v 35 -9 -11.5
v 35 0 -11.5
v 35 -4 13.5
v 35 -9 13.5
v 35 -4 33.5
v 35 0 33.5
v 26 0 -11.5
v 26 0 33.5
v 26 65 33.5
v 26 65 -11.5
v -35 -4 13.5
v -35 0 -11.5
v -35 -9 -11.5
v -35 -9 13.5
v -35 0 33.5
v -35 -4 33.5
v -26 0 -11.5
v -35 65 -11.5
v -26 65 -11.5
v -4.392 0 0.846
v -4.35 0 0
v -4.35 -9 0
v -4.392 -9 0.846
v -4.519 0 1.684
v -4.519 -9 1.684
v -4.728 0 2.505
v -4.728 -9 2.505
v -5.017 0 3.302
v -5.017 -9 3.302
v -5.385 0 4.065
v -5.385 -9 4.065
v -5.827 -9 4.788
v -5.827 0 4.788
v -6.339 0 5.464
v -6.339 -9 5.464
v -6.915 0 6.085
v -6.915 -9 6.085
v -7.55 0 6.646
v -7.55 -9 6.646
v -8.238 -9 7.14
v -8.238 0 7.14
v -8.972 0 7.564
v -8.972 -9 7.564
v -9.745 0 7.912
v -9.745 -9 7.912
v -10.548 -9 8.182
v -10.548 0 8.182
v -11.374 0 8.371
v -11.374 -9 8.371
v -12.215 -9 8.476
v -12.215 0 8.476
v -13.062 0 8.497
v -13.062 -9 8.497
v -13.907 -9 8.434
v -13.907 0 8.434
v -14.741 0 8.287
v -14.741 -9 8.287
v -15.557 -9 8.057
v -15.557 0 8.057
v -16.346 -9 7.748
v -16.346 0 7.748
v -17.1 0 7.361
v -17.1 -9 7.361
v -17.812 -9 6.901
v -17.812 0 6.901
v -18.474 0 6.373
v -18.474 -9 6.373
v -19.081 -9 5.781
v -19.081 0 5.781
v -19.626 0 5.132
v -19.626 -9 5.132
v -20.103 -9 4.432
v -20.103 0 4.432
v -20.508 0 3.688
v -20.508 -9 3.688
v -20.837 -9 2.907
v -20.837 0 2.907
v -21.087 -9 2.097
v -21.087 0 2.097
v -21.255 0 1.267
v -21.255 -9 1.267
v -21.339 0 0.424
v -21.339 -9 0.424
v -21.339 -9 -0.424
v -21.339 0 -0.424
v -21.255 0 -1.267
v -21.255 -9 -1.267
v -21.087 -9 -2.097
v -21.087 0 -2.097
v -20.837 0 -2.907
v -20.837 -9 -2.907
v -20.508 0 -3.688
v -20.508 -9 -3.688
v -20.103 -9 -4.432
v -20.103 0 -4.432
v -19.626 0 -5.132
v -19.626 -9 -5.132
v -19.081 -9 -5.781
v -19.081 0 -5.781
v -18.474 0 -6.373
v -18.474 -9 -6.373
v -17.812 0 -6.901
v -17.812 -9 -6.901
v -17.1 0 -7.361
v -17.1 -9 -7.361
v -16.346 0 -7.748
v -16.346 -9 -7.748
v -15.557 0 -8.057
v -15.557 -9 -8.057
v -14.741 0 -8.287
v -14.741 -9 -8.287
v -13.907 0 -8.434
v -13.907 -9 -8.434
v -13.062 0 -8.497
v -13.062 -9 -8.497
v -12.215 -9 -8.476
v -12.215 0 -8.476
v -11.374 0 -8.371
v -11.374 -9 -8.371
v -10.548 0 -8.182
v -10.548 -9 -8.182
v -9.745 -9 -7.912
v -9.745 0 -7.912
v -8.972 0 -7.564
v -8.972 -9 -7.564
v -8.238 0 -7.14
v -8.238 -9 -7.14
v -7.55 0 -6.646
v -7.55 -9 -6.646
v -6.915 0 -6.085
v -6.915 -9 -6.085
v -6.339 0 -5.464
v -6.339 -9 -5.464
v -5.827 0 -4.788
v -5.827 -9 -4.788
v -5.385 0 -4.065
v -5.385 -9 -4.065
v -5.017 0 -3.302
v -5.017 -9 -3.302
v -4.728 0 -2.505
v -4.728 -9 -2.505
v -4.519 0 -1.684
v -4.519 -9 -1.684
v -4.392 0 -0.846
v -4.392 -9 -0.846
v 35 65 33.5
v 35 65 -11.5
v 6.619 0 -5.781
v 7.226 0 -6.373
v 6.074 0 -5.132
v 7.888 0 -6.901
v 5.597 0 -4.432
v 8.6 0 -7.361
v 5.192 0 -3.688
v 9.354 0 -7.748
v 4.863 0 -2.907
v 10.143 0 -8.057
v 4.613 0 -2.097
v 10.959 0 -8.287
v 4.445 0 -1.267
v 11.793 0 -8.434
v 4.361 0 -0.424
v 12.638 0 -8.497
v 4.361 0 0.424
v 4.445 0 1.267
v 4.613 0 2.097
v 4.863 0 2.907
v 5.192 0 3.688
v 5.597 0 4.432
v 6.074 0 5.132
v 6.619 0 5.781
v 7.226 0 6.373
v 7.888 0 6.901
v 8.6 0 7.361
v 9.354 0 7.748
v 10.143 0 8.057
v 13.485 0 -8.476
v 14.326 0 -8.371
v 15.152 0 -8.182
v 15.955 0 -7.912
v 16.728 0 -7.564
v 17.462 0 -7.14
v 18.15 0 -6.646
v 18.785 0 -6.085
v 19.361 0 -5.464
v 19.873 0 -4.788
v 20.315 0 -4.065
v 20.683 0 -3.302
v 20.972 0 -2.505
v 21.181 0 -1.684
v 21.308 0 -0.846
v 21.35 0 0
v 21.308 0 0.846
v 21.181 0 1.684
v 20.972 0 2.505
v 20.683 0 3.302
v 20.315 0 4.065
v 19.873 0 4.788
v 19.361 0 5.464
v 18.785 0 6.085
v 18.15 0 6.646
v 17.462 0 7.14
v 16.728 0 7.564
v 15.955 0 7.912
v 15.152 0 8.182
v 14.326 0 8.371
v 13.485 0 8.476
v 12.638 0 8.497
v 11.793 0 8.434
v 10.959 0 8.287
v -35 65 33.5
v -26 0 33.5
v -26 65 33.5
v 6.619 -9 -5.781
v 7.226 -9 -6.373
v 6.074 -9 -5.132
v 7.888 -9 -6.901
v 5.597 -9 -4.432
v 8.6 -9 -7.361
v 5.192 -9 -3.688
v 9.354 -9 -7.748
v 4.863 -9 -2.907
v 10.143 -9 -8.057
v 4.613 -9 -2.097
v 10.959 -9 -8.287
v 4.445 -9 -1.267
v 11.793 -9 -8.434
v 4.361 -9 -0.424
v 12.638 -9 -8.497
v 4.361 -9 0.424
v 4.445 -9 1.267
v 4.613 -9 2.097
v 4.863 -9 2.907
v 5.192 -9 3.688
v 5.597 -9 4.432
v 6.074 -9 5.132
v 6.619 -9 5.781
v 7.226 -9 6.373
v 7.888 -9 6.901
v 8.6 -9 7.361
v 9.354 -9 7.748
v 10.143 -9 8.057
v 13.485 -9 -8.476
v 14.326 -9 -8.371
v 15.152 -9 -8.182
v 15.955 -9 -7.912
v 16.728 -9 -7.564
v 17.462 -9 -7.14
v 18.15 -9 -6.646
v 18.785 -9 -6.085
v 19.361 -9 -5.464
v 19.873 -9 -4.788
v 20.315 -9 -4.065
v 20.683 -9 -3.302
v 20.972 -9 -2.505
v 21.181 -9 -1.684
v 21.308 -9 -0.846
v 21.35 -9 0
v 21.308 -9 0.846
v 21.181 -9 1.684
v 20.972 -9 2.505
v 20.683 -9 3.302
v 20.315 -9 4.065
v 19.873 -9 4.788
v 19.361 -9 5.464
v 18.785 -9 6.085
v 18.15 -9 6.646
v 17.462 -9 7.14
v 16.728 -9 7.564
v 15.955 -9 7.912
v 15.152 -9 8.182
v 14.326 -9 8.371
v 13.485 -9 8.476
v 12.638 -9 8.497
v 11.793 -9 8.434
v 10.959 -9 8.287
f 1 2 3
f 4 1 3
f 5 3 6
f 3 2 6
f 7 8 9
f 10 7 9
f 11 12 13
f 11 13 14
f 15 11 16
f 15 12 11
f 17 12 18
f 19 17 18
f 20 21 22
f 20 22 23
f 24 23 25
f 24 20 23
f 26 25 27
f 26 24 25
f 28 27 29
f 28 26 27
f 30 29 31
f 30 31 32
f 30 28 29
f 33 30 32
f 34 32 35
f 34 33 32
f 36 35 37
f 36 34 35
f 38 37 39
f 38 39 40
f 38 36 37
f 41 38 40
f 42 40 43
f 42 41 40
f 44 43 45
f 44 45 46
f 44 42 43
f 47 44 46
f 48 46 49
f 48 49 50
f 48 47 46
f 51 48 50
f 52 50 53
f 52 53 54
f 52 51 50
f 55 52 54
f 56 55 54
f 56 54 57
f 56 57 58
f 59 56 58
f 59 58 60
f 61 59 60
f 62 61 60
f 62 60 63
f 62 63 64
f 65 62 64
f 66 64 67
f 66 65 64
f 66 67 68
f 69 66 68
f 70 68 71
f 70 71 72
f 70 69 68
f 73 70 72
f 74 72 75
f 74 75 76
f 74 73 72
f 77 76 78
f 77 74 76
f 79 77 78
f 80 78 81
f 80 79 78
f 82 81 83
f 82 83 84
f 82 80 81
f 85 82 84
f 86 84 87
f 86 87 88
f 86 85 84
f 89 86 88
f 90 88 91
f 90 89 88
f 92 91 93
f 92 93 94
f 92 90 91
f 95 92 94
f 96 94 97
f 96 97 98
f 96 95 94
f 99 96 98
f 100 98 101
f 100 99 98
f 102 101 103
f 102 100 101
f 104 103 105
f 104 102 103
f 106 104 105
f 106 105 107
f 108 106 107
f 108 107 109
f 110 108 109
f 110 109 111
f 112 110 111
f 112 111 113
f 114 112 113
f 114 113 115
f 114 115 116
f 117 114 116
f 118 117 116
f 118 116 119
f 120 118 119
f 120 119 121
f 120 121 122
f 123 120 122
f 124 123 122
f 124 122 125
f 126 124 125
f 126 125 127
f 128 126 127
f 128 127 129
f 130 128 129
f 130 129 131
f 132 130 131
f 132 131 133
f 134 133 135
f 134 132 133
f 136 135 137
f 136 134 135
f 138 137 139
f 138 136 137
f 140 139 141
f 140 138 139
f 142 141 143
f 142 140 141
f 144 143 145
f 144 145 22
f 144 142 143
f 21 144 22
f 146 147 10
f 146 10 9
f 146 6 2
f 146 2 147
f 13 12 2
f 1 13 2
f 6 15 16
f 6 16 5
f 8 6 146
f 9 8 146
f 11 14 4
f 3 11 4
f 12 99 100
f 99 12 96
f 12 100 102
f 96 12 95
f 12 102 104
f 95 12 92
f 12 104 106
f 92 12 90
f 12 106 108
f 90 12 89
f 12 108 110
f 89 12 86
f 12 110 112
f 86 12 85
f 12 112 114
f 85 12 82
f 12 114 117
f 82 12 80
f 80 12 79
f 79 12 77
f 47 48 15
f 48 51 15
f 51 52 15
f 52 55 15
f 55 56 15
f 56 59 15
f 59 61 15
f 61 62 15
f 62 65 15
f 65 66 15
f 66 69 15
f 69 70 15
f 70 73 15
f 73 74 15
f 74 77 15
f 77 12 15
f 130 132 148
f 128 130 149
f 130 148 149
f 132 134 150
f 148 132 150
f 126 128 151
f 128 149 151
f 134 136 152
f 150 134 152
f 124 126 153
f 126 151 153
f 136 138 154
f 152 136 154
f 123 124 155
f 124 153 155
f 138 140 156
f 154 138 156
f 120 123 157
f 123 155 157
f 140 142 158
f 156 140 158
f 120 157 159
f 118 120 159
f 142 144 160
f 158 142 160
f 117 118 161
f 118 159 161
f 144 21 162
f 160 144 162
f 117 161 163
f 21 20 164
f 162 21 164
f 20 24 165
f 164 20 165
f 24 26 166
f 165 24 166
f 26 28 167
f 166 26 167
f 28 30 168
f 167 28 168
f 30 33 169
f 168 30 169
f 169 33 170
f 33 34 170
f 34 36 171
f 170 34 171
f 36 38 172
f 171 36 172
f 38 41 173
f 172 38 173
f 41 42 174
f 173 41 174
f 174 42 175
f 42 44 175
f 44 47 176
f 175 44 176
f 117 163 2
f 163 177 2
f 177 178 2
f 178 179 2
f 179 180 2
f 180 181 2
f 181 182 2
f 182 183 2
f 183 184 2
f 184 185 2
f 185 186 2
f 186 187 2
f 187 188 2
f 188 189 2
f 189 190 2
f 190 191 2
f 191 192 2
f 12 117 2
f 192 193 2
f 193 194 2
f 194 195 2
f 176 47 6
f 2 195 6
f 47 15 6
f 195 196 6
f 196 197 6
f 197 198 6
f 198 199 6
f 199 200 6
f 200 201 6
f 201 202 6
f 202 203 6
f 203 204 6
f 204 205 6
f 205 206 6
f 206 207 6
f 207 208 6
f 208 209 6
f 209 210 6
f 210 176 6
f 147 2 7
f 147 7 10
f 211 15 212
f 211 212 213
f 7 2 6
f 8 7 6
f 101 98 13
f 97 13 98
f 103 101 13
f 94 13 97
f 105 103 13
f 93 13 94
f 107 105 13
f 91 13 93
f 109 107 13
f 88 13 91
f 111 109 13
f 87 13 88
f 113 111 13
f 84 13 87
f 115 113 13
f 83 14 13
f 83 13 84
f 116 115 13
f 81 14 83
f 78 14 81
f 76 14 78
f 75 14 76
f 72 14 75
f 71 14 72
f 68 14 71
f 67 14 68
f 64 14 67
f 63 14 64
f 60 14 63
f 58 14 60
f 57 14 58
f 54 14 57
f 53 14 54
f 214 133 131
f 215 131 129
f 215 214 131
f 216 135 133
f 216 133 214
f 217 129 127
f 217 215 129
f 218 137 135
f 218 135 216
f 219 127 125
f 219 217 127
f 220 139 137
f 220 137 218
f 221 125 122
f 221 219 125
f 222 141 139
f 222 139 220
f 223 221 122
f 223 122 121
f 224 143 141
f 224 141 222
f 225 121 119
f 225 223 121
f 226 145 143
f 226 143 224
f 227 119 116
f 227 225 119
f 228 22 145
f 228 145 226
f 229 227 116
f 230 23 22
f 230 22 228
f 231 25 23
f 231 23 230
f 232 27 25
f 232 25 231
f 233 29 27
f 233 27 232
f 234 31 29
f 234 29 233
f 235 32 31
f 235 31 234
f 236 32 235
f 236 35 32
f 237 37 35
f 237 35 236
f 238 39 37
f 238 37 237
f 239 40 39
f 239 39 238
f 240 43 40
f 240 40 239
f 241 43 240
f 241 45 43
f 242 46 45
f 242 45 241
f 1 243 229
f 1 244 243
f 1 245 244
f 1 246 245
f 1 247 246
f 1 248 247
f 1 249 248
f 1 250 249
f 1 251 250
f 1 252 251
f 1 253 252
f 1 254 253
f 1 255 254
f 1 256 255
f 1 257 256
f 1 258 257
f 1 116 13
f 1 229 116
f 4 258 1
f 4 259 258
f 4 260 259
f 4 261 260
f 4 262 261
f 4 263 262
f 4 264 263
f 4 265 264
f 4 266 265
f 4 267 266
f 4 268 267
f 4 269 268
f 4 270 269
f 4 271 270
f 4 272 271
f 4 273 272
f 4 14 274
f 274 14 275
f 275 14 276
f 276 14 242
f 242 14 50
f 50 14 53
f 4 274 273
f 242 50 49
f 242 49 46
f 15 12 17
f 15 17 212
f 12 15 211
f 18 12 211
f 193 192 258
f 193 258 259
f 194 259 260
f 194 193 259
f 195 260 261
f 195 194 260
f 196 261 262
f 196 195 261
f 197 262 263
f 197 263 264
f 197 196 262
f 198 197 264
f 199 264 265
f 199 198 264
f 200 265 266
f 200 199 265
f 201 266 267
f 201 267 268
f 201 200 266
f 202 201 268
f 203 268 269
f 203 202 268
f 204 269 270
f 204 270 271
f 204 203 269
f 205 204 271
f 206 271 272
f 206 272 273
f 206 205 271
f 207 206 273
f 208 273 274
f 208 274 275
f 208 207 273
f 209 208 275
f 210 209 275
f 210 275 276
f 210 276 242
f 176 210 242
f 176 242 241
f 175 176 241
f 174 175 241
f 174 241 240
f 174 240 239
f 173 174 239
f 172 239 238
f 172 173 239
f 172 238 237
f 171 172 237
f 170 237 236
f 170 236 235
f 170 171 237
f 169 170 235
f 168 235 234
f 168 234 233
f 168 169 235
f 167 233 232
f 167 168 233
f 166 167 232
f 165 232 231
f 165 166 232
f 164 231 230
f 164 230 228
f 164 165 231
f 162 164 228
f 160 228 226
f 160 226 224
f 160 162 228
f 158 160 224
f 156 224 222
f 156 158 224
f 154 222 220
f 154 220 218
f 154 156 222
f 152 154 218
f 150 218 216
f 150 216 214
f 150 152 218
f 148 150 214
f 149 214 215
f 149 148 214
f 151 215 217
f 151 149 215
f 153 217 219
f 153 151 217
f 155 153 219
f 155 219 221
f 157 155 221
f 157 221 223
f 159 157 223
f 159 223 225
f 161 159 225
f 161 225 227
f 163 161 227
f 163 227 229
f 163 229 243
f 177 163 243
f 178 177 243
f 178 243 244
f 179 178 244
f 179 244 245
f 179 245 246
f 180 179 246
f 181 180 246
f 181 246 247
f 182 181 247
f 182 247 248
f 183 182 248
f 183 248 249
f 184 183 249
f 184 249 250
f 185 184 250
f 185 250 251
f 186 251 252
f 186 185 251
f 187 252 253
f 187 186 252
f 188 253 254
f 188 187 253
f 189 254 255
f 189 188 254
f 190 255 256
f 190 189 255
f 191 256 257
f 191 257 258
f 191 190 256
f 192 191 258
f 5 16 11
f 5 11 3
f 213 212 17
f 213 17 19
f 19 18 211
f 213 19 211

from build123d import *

# Parameters (mm, degrees)
F0_W     = 70
F0_H     = 45
F0_R     = 8.5
F1_DEPTH = 9
F2_W     = 70
F2_H     = 20
F3_DEPTH = 5
F4_W     = 65
F4_H     = 45
F5_DEPTH = 9


with BuildPart() as f1:
    # F0 (on Front) → F1 (new body)
    with BuildSketch(Plane.XZ):
        with Locations((0, 11)):
            Rectangle(F0_W, F0_H)
        with Locations((-12.85, 0)):
            Circle(F0_R, mode=Mode.SUBTRACT)
        with Locations((12.85, 0)):
            Circle(F0_R, mode=Mode.SUBTRACT)
    extrude(amount=F1_DEPTH)

    # F2 (on face) → F3 (cut)
    with BuildSketch(Plane.XZ.offset(9)):
        with Locations((0, 23.5)):
            Rectangle(F2_W, F2_H)
    extrude(amount=-F3_DEPTH, mode=Mode.SUBTRACT)


with BuildPart() as f5:
    # F4 (on face) → F5 (new body)
    with BuildSketch(Plane.YZ.offset(35)):
        with Locations((32.5, 11)):
            Rectangle(F4_W, F4_H)
    extrude(amount=-F5_DEPTH)


with BuildPart() as f6_1:
    # F6: instance of F5
    add(f5.part.mirror(Plane.YZ))


solid = Compound([f1.part, f5.part, f6_1.part])
